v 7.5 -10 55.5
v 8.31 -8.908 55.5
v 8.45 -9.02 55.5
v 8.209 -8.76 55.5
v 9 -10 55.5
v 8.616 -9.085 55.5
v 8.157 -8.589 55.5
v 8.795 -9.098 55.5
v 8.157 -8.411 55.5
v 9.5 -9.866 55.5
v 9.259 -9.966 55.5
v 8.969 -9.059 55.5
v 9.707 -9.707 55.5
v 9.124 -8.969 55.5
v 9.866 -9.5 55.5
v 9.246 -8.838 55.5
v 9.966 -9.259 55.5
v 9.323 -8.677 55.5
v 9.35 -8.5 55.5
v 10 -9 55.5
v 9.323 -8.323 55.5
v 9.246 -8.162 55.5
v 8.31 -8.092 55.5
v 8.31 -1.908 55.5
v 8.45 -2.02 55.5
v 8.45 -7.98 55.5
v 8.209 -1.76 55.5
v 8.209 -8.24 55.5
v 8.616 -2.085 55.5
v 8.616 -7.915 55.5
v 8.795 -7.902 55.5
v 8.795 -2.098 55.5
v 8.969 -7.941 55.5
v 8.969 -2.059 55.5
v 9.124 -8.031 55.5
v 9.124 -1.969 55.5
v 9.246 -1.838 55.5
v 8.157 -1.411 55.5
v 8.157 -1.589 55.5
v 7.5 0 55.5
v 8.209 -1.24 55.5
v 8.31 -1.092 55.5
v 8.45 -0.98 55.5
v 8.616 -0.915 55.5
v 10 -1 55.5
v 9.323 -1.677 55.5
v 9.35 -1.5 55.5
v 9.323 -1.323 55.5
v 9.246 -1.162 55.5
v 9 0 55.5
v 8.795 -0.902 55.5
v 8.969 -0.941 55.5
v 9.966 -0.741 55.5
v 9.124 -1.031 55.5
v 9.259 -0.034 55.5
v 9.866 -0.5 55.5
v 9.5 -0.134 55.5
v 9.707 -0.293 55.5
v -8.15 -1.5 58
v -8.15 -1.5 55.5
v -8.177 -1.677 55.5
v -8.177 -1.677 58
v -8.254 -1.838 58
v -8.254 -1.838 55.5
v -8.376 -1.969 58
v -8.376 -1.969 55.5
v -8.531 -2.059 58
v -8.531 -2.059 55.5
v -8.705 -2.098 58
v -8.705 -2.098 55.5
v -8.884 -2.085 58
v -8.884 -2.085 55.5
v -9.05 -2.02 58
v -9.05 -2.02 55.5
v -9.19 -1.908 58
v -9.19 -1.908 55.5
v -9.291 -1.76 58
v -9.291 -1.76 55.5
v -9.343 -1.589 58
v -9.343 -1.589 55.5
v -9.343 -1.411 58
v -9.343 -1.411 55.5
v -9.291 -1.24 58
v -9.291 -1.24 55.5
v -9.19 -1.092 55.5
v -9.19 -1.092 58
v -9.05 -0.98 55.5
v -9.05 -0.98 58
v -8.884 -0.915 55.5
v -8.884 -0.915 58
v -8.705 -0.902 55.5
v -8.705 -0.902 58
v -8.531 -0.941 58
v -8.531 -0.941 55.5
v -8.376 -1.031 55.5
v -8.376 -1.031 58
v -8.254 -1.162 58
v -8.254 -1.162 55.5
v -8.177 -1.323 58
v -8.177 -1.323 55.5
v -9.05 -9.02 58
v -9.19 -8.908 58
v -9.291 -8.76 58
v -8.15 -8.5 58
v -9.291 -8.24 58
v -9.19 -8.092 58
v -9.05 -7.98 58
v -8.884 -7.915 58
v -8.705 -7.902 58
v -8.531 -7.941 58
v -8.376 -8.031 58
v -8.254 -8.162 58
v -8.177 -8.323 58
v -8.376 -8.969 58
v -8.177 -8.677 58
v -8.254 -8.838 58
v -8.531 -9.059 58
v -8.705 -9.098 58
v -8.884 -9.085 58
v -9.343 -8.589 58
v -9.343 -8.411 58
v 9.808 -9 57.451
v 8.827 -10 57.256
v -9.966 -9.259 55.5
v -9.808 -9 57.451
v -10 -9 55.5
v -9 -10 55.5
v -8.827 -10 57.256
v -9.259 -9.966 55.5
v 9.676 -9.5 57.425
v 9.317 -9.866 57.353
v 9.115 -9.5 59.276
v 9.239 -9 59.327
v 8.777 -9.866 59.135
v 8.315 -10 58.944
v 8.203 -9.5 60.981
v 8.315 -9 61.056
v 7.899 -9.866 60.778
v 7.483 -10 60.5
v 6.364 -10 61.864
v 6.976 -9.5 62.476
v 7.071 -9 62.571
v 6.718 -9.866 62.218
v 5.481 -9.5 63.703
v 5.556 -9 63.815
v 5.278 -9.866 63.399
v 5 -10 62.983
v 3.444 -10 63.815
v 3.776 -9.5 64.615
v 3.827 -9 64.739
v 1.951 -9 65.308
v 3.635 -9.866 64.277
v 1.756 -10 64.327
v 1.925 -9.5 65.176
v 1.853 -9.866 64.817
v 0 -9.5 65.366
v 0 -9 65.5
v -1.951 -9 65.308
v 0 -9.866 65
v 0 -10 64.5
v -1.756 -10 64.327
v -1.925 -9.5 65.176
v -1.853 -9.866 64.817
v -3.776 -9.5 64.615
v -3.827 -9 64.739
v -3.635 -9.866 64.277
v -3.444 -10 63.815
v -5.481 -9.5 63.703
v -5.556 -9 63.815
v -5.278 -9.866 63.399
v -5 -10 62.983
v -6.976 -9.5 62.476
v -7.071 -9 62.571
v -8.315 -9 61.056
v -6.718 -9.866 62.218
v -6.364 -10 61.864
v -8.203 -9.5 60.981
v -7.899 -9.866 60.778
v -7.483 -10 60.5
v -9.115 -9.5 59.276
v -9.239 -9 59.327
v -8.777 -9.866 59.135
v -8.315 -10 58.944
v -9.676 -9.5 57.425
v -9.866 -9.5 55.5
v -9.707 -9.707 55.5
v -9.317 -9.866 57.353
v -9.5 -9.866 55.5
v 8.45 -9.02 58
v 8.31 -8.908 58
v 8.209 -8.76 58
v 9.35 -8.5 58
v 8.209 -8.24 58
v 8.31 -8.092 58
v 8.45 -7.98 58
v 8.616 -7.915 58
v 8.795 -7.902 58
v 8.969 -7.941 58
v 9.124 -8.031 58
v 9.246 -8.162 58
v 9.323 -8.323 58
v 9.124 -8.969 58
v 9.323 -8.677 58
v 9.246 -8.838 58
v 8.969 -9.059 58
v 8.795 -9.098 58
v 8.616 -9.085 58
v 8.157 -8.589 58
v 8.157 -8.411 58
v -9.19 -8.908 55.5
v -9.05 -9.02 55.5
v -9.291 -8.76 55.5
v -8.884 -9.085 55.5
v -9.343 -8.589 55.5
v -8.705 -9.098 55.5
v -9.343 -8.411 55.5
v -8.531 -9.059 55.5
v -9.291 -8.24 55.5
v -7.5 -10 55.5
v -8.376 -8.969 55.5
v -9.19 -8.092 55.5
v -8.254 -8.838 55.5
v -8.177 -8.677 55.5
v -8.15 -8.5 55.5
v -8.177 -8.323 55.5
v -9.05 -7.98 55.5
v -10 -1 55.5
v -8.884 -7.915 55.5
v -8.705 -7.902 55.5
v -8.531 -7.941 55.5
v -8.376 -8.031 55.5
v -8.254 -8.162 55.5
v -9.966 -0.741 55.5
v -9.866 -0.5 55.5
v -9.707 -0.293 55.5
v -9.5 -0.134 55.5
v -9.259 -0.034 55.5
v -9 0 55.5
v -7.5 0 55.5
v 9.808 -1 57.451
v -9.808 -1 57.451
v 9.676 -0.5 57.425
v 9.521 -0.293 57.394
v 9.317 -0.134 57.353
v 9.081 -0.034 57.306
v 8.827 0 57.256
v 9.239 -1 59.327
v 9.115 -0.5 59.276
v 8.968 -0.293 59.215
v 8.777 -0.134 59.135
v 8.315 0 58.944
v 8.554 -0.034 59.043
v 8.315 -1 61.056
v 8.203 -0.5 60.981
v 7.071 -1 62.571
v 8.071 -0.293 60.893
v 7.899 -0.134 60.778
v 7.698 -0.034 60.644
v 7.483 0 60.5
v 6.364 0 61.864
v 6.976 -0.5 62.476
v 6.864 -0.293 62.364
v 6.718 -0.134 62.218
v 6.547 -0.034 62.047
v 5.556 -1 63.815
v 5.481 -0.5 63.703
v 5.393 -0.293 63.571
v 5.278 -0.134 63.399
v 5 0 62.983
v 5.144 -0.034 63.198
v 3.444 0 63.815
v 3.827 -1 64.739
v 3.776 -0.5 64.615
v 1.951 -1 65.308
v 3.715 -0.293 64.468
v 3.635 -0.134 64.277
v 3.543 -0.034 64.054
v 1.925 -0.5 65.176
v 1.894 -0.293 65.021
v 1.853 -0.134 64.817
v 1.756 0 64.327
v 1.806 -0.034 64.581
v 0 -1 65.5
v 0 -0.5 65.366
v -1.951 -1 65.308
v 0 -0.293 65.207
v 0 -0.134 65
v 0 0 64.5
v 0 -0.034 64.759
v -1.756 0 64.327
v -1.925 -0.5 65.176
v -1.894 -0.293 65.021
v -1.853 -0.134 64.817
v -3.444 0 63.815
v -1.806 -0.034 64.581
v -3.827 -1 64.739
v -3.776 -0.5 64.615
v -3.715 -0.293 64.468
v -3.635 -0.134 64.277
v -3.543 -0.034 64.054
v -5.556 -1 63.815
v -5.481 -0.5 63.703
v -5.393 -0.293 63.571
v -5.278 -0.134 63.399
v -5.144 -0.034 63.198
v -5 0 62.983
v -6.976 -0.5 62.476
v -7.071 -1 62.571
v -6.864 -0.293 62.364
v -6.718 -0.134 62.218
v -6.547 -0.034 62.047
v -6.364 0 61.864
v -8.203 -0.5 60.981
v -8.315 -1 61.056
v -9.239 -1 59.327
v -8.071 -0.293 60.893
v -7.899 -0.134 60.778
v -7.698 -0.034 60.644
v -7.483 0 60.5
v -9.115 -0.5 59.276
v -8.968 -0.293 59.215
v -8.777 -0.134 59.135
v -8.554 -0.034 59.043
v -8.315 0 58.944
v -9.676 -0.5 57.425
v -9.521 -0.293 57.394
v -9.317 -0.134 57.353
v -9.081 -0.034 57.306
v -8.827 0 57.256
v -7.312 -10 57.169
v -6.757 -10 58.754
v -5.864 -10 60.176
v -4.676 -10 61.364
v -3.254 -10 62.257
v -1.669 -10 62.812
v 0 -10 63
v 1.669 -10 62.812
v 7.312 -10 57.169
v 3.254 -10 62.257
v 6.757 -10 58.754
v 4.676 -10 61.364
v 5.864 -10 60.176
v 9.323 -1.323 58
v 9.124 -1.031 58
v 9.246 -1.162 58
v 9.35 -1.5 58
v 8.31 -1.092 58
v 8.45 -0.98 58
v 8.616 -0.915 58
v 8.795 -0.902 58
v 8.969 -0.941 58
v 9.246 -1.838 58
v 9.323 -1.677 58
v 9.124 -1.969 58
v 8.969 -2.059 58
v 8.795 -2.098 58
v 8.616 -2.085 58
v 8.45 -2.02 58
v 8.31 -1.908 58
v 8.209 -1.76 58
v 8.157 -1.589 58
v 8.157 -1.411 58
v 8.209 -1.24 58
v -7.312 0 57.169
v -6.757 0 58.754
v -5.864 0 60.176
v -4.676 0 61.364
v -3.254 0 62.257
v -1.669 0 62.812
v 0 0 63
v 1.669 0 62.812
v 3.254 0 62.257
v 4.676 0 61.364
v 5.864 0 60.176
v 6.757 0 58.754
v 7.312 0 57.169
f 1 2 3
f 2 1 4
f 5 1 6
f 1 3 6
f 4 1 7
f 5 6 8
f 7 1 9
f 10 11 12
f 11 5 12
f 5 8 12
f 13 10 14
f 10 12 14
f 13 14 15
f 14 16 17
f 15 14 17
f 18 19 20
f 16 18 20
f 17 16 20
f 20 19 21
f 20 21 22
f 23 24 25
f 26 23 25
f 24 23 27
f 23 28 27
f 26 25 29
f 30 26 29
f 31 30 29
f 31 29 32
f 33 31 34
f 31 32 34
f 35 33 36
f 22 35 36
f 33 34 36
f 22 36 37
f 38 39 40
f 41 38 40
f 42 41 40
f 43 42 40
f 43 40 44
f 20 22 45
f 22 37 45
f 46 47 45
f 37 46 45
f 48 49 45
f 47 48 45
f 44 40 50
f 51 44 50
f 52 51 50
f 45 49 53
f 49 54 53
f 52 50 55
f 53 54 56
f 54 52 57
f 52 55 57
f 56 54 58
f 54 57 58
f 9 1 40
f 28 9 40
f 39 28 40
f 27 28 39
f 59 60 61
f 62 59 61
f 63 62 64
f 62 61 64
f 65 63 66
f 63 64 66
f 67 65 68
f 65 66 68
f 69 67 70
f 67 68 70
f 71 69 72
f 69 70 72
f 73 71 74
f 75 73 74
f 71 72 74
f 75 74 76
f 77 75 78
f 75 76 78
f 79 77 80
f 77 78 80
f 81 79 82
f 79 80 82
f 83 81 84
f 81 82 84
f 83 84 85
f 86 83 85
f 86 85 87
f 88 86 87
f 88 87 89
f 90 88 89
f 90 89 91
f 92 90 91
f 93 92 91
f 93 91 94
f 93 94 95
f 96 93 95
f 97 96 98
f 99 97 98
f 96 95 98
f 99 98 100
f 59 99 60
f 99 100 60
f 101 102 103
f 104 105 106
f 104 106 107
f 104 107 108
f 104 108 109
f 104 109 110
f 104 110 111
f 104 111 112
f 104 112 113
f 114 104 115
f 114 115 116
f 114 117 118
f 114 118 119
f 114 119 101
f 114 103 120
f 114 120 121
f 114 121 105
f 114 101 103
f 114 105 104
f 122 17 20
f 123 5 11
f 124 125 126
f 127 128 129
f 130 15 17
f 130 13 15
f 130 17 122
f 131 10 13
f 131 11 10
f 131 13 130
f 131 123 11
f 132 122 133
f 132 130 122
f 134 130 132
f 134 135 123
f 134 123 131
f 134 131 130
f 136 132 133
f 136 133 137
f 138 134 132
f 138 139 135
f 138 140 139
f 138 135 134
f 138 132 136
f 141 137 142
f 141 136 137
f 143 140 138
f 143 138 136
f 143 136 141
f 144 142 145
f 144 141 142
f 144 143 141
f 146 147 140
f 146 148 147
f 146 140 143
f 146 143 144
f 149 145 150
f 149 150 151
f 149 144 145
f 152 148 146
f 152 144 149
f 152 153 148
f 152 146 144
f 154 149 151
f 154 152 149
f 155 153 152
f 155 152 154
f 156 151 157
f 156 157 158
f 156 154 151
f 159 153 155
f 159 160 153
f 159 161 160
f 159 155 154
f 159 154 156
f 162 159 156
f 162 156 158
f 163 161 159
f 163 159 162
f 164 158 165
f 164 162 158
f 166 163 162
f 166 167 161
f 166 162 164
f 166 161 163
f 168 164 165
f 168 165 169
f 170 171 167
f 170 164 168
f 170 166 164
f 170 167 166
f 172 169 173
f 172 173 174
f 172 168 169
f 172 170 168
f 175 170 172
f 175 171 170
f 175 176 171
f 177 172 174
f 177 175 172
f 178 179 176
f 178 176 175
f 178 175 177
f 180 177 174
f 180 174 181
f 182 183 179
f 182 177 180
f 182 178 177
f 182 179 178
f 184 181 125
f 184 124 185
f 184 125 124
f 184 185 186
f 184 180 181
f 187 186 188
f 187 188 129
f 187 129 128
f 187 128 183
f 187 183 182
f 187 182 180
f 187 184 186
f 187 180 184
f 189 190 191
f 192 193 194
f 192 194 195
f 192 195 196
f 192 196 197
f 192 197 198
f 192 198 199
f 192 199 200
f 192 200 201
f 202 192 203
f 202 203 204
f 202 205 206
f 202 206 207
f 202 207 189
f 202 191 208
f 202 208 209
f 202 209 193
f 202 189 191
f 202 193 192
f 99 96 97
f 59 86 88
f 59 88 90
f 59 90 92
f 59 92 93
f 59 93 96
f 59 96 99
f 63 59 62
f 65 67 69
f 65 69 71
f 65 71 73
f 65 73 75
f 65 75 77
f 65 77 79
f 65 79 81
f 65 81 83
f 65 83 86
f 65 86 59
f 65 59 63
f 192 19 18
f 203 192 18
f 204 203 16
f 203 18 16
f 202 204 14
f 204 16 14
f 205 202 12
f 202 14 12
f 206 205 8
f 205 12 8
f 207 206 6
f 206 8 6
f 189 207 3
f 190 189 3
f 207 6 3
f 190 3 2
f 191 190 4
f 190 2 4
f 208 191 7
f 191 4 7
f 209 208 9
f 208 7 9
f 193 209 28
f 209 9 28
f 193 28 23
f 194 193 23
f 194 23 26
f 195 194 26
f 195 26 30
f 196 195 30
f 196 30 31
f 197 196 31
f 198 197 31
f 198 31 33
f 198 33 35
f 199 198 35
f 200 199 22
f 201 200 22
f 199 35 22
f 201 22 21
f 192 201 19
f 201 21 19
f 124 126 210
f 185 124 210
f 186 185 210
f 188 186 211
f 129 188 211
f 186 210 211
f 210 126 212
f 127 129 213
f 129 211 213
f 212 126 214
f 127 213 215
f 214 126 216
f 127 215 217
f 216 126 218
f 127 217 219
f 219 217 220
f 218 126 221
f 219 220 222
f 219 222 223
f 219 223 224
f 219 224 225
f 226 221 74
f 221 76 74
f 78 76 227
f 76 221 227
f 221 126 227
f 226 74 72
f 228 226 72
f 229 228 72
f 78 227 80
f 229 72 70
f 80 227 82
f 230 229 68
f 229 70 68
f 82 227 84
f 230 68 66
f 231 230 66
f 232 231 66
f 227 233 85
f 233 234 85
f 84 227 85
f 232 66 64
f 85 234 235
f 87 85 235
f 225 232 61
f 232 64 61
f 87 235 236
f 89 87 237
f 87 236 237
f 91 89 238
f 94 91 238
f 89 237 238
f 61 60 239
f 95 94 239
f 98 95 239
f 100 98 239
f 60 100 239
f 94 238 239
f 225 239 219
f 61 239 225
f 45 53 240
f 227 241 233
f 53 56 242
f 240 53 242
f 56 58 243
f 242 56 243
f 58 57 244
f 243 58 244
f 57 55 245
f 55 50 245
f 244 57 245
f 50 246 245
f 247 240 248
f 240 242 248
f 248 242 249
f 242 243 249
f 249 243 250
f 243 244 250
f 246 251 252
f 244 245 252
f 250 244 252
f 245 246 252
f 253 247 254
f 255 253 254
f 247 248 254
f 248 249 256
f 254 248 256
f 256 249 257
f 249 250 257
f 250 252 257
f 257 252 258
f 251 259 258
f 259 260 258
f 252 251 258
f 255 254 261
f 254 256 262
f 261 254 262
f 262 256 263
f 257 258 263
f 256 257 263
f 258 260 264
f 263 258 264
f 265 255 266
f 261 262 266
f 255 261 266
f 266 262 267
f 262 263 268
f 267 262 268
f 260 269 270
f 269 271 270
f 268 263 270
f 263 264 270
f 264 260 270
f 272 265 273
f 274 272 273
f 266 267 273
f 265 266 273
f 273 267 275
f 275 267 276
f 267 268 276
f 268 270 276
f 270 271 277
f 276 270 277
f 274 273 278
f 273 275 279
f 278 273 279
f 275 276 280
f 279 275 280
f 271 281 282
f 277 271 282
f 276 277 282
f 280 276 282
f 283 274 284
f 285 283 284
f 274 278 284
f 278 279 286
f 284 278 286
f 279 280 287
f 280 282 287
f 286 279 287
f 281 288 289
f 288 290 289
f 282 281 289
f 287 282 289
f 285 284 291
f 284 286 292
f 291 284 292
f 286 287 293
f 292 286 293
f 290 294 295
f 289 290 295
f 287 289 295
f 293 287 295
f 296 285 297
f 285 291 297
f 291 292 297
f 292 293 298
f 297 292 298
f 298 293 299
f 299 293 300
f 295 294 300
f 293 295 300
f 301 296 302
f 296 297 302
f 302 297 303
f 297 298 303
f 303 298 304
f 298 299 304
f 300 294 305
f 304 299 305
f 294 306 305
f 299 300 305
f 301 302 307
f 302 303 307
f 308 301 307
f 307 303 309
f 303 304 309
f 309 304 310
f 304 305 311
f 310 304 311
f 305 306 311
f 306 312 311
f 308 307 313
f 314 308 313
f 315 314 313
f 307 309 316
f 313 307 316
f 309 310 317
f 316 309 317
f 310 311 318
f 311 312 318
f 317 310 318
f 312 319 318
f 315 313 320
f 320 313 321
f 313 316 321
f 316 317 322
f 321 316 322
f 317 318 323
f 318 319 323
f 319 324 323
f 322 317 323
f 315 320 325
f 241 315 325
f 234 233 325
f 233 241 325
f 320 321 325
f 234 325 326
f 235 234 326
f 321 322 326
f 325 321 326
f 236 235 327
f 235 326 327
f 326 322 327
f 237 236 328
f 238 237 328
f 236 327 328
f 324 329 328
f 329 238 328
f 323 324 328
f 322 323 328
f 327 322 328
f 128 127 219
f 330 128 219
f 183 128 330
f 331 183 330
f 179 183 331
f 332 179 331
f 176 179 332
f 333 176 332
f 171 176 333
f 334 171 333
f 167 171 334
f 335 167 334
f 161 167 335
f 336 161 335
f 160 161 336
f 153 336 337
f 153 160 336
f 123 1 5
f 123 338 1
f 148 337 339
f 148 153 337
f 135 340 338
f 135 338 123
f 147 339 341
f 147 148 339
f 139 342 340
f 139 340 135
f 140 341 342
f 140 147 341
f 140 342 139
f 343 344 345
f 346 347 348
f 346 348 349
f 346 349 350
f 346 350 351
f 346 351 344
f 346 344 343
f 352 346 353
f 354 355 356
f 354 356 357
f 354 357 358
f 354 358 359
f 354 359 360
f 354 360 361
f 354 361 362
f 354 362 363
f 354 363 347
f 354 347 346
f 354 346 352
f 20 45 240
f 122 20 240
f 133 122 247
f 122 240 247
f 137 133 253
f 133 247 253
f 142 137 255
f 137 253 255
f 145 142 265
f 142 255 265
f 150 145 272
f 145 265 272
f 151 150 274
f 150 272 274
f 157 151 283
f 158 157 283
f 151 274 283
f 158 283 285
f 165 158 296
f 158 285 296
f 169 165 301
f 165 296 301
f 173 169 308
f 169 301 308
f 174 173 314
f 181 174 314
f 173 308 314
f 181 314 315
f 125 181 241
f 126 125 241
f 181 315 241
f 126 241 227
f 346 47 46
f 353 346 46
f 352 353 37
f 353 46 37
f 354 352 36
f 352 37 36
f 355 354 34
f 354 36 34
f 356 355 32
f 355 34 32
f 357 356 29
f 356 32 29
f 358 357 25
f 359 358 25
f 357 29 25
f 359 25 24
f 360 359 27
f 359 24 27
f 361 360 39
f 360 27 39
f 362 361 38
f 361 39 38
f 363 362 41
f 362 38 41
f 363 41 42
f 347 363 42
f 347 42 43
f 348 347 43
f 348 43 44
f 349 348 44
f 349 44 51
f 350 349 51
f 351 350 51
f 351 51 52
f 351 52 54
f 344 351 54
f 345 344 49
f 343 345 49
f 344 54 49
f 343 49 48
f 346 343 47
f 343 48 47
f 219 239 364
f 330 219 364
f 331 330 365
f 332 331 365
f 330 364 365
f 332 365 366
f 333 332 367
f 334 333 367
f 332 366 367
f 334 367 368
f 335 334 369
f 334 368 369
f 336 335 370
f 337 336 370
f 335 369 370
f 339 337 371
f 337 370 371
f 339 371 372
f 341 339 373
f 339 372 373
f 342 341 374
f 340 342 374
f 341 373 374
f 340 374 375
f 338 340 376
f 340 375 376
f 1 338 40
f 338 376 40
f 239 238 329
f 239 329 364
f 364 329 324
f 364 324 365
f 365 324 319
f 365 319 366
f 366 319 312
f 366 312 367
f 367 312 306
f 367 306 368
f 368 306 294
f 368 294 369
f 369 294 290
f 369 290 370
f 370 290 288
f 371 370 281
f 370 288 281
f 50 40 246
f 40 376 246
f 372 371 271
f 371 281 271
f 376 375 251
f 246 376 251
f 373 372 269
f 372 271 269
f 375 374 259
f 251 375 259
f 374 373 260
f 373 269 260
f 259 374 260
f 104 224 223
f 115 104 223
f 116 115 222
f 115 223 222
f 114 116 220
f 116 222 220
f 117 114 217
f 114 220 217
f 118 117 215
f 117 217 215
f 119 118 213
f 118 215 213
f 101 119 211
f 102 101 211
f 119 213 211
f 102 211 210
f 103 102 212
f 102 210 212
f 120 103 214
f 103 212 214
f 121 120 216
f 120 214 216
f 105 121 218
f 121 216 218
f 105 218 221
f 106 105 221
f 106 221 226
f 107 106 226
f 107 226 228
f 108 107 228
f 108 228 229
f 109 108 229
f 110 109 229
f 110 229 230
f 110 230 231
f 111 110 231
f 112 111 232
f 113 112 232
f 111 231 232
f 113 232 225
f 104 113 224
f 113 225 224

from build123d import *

# Parameters (mm, degrees)
F1_DEPTH = 10
F2_R     = 1
F3_R     = 0.6
F4_DEPTH = 2.5


with BuildPart() as f1:
    # F0 (on Front) → F1 (new body)
    with BuildSketch(Plane.XZ):
        with BuildLine():
            Line((7.5, 55.5), (10, 55.5))
            ThreePointArc((10, 55.5), (0, 65.5), (-10, 55.5))
            Line((-10, 55.5), (-7.5, 55.5))
            ThreePointArc((-7.5, 55.5), (0, 63), (7.5, 55.5))
        make_face()
    extrude(amount=F1_DEPTH)

    # F2
    f2_edges = [f1.edges().sort_by_distance(p)[0] for p in [
        (0, 0, 65.5),
        (0, -10, 65.5),
    ]]
    fillet(f2_edges, radius=F2_R)

    # F3 (on face) → F4 (cut)
    with BuildSketch(Plane(origin=(0, 0, 55.5), x_dir=(1, 0, 0), z_dir=(0, 0, -1))):
        with Locations((8.75, 1.5)):
            Circle(F3_R)
        with Locations((8.75, 8.5)):
            Circle(F3_R)
        with Locations((-8.75, 1.5)):
            Circle(F3_R)
        with Locations((-8.75, 8.5)):
            Circle(F3_R)
    extrude(amount=-F4_DEPTH, mode=Mode.SUBTRACT)


solid = f1.part
